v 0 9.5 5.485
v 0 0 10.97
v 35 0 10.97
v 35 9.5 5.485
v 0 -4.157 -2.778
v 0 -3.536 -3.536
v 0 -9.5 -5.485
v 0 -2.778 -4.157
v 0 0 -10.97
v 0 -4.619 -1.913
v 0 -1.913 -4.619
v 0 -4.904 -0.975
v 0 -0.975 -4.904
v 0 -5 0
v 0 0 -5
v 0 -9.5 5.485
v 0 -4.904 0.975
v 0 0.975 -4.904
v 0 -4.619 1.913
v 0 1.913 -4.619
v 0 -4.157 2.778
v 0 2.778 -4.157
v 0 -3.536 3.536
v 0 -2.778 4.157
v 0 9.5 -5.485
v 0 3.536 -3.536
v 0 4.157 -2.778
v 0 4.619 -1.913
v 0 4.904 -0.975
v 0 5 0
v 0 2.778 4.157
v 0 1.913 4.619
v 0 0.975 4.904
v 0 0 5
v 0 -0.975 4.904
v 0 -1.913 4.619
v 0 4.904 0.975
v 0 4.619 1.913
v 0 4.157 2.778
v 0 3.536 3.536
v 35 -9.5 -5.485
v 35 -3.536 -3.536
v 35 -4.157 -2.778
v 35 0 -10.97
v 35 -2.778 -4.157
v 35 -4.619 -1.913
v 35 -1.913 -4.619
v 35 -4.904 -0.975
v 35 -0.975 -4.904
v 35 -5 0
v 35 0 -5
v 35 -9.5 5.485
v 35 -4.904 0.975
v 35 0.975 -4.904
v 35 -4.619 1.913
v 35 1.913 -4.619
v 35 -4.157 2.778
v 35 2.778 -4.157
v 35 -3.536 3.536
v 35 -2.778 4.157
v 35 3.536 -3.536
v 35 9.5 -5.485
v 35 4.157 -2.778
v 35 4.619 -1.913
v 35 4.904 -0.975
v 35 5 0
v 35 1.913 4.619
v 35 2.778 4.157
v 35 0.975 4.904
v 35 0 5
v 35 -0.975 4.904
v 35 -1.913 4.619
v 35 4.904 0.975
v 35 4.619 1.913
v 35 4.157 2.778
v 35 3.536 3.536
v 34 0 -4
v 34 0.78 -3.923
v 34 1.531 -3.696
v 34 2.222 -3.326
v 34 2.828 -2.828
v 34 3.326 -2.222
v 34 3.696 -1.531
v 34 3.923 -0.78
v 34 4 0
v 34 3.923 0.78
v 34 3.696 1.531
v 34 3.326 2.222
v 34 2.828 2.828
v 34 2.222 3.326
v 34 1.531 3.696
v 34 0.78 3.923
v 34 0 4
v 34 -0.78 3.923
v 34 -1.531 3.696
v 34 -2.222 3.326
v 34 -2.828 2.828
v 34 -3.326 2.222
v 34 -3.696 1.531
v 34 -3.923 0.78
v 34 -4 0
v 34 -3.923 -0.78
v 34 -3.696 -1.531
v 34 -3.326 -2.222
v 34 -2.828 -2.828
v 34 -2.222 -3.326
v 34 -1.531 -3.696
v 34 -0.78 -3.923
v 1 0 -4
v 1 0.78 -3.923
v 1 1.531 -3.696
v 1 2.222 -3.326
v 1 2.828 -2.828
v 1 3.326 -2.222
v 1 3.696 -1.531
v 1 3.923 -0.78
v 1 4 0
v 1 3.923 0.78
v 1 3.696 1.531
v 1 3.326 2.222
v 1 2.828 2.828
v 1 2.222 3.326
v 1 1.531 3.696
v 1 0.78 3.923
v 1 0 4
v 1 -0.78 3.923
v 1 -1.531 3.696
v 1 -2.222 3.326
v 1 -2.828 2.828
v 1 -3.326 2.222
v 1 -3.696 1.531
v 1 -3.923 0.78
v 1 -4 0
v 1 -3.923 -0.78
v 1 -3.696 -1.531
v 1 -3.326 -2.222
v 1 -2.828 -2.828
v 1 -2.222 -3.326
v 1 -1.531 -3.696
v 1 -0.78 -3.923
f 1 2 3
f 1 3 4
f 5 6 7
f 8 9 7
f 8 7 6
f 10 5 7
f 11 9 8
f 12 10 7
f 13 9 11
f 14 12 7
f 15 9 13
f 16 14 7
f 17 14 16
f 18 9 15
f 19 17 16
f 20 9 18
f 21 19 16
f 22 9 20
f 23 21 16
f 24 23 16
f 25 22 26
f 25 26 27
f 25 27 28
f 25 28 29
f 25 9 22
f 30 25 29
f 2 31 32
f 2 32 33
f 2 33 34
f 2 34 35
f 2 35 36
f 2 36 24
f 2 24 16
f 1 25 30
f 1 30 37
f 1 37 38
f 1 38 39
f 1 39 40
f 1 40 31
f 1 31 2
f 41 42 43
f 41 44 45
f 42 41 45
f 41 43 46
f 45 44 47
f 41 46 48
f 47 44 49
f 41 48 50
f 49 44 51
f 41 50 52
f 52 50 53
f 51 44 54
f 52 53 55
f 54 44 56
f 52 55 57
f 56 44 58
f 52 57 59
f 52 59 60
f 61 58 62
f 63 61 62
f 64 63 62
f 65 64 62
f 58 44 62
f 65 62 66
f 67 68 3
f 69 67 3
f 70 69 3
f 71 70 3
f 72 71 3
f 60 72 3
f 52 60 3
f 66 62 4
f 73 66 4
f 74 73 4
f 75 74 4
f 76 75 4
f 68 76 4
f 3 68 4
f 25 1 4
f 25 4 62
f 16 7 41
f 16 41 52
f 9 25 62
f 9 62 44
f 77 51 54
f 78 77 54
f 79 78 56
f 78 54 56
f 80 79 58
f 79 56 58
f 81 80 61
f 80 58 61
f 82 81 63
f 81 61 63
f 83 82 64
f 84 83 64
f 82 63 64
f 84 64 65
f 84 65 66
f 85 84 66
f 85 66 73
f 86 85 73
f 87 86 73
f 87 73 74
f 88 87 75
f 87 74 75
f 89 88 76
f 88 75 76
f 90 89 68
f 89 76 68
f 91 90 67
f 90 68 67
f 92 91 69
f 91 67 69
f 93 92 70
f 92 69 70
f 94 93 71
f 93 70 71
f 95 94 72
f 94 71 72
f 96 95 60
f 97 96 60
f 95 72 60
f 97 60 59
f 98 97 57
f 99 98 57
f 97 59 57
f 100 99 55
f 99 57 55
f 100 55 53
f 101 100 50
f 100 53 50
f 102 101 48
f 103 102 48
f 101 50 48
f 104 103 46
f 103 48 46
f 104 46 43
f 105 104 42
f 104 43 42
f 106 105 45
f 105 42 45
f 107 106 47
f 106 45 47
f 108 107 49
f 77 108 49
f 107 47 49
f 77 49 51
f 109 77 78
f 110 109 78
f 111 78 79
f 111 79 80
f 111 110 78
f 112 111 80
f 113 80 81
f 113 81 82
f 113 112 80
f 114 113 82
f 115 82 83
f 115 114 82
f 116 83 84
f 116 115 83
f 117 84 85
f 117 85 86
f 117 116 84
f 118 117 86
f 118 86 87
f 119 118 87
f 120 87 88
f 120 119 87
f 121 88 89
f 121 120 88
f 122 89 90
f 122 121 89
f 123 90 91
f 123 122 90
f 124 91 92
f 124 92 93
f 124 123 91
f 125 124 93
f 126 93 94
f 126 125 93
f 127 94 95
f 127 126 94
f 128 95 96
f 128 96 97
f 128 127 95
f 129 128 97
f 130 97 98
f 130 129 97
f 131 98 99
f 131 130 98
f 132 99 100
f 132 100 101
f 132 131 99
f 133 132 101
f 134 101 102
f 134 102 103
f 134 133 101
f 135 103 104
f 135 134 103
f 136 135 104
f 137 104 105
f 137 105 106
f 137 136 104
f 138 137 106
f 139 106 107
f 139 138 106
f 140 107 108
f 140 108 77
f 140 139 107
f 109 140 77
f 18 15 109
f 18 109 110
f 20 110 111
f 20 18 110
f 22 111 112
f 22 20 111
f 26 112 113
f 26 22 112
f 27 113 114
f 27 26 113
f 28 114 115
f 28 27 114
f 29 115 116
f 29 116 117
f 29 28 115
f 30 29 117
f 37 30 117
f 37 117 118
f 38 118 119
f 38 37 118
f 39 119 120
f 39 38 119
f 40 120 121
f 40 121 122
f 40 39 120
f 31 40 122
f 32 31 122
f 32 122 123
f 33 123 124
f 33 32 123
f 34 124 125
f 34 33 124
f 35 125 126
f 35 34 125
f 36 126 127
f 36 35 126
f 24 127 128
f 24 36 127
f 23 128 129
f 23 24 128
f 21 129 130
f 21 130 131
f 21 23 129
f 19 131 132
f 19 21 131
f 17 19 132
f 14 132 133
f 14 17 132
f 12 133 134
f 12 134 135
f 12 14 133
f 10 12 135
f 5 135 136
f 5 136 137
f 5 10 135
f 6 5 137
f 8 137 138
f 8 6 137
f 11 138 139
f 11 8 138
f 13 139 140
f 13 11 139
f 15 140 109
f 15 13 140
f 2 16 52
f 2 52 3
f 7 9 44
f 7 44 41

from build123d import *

# Parameters (mm, degrees)
SKETCH_2_R      = 4
EXTRUDE_1_DEPTH = 35
CHAMFER_1_SIZE  = 1


with BuildPart() as part:
    # Эскиз2 → Бобышка-Вытянуть1 (new body)
    with BuildSketch(Plane(origin=(0, 0, 0), x_dir=(0, 0, -1), z_dir=(1, 0, 0))):
        Polygon((-10.969655115, 0), (-5.484827557, 9.5), (5.484827557, 9.5), (10.969655115, 0), (5.484827557, -9.5), (-5.484827557, -9.5), align=None)
        Circle(SKETCH_2_R, mode=Mode.SUBTRACT)
    extrude(amount=EXTRUDE_1_DEPTH)

    # Фаска1
    chamfer_1_edges = [part.edges().sort_by_distance(p)[0] for p in [
        (0, 0, 4),
        (35, 0, 4),
    ]]
    chamfer(chamfer_1_edges, length=CHAMFER_1_SIZE)


solid = part.part
